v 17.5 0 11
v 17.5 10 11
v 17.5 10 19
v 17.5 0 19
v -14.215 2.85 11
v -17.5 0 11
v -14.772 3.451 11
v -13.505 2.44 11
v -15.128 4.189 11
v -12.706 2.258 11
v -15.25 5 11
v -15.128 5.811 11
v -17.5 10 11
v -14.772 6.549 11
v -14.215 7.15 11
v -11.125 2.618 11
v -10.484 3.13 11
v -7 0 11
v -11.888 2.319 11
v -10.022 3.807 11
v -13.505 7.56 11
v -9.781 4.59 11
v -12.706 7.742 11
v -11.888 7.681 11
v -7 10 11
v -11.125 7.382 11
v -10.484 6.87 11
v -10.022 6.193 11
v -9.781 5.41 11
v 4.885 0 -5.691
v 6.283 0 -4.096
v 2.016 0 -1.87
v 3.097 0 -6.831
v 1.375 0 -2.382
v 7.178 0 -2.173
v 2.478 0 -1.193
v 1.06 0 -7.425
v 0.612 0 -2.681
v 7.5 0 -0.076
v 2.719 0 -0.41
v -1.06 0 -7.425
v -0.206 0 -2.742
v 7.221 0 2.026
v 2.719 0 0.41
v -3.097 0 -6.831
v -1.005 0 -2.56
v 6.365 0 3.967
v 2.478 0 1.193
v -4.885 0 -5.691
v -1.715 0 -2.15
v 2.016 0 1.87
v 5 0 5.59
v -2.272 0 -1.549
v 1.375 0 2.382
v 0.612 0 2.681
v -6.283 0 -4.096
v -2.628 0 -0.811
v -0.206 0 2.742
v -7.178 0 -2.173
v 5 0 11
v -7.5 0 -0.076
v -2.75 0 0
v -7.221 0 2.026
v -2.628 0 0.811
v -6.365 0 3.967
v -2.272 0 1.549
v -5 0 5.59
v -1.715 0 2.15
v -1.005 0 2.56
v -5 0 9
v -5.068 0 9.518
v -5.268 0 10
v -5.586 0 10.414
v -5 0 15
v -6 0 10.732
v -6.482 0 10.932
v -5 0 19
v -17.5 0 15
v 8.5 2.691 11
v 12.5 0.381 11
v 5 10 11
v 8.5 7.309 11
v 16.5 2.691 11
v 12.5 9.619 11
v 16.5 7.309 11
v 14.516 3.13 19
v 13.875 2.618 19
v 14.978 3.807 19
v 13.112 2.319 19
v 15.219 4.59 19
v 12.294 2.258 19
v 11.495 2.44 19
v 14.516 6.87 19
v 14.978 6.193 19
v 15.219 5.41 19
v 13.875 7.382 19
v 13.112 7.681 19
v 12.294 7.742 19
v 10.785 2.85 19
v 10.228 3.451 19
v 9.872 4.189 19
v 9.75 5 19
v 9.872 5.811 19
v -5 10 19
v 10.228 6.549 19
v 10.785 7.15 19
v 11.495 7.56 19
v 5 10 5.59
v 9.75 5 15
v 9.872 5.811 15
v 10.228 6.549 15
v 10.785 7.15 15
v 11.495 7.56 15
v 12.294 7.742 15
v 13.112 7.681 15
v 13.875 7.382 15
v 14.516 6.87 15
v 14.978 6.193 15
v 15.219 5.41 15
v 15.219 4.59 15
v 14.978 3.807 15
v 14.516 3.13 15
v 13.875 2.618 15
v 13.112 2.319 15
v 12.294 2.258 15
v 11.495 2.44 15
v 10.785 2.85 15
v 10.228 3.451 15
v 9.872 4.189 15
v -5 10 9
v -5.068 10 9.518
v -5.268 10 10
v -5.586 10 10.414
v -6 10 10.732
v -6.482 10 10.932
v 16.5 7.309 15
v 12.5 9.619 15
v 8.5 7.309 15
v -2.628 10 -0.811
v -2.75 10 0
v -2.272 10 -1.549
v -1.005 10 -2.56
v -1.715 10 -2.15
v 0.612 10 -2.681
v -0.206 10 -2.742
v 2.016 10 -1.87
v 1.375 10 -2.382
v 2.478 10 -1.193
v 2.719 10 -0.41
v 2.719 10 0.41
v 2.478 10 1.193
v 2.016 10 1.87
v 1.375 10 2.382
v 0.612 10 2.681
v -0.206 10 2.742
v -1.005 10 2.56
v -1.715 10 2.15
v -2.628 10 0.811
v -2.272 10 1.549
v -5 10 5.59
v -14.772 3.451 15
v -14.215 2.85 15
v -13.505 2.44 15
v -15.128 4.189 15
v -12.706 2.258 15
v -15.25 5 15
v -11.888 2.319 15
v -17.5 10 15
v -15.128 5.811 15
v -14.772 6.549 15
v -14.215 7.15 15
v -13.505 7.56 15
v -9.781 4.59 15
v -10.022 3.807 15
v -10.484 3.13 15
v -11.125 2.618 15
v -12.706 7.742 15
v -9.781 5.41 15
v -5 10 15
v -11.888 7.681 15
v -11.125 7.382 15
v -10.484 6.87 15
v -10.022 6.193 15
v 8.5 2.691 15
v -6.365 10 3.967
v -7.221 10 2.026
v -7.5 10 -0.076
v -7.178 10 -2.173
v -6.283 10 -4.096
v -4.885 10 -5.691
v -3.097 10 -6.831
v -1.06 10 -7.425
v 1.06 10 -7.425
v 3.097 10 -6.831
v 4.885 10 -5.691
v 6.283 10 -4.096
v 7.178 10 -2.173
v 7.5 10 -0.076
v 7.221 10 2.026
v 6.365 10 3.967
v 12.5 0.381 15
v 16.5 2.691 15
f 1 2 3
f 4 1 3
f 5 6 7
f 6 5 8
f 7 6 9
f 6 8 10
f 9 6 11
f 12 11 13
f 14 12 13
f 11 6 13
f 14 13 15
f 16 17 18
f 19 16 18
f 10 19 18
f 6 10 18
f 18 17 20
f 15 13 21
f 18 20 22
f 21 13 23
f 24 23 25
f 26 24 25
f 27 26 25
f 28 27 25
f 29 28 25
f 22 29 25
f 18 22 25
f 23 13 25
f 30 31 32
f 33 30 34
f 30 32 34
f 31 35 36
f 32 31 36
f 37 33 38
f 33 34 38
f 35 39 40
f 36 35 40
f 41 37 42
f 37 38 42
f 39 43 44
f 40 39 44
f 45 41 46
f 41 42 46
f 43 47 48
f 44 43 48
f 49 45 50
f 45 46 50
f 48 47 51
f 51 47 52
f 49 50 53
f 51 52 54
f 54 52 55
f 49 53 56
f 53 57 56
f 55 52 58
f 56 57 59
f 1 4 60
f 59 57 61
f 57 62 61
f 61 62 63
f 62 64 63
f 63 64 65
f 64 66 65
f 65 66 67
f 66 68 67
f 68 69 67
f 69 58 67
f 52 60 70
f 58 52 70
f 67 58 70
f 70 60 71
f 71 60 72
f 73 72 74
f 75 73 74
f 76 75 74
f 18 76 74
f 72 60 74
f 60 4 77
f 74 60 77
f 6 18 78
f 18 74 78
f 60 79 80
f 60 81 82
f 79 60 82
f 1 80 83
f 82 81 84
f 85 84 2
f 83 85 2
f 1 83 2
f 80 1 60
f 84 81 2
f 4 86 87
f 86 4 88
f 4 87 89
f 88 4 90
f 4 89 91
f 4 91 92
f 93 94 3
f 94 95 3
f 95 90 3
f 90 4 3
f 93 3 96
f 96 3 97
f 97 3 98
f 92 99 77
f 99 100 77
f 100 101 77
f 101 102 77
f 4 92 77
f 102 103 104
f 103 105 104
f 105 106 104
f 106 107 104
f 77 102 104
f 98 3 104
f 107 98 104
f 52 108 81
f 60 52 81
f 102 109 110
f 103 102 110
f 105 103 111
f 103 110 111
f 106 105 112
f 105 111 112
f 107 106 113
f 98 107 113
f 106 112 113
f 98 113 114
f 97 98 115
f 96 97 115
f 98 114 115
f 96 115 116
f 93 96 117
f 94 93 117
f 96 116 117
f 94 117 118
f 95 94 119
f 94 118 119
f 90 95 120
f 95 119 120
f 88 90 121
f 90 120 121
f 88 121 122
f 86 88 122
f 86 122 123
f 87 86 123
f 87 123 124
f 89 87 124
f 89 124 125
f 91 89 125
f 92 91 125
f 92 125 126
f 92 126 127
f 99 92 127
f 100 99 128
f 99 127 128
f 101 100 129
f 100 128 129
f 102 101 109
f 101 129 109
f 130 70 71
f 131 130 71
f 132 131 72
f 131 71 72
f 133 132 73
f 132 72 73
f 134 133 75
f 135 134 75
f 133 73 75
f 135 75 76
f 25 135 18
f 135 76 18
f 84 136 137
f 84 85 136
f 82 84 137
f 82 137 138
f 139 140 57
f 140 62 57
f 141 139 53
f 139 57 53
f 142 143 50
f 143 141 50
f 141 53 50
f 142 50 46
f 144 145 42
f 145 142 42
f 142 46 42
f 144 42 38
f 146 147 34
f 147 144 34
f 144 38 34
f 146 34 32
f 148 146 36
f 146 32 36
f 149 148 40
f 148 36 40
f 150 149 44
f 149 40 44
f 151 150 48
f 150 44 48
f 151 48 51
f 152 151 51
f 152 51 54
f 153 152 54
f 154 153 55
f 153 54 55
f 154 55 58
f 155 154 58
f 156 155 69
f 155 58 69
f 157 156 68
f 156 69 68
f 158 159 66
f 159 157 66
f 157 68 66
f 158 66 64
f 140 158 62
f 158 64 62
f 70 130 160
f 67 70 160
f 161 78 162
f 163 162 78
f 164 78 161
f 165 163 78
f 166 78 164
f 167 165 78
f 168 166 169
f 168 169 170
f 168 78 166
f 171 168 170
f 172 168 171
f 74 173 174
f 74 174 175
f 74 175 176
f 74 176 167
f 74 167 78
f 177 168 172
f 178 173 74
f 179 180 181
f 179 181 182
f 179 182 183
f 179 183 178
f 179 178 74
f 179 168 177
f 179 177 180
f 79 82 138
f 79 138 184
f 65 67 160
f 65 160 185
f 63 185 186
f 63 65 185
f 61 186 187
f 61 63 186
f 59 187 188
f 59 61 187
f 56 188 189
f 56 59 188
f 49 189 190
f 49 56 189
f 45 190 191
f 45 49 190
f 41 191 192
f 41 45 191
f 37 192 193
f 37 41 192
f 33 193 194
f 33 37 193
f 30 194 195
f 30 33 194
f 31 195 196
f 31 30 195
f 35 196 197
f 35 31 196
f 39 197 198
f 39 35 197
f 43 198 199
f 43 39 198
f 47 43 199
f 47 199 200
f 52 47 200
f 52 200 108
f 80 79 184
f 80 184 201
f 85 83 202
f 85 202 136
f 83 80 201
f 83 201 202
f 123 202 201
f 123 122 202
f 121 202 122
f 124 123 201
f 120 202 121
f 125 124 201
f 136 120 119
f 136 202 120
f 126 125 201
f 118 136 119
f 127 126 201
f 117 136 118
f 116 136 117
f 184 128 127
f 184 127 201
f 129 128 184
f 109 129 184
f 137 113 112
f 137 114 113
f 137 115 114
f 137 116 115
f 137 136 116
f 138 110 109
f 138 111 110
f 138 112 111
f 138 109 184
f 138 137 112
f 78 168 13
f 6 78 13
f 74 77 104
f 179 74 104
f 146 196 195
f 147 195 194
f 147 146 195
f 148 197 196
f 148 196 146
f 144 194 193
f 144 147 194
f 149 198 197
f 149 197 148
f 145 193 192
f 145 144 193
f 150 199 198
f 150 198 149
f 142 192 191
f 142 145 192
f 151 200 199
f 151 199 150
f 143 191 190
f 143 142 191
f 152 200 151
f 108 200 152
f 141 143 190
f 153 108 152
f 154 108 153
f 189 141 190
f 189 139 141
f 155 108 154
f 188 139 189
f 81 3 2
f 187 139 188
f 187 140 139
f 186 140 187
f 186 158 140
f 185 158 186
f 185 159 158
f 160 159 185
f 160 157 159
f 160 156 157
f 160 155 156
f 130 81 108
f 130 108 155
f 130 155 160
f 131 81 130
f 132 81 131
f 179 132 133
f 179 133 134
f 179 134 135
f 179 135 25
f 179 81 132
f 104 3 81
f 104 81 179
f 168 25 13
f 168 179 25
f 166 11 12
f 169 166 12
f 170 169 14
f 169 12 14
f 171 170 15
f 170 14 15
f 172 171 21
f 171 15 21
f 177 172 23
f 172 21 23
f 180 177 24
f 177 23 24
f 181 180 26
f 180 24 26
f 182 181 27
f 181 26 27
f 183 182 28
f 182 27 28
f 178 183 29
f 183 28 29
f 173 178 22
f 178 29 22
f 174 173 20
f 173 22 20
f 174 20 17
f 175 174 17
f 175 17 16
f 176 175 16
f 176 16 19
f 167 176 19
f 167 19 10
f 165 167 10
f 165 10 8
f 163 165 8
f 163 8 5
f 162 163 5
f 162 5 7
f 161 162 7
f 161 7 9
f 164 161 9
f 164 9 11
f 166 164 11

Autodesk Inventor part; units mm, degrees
ref_plane "YZ Plane" through (0, 0, 0) normal (1, 0, 0) x (0, 1, 0)
ref_plane "XZ Plane" through (0, 0, 0) normal (0, 1, 0) x (-1, 0, 0)
ref_plane "XY Plane" through (0, 0, 0) normal (0, 0, 1) x (1, 0, 0)
sketch "Sketch4" plane through (0, 0, 0) normal (0, 1, 0) x (-1, 0, 0)
  circle A0 centre (0, 0) radius 7.5
  circle A1 centre (0, 0) radius 2.75
  dimension "d19" = 15
  dimension "d20" = 5.5
extrude "Extrusion4" add sketch "Sketch4" along normal blind 10
ref_plane "Work Plane1" through (0, 10, 0) normal (0, -1, 0) x (1, 0, 0)
sketch "Sketch7" plane through (0, 10, 0) normal (0, -1, 0) x (1, 0, 0)
  line L0 (0, 0) -> (0, 15)
  line L1 (17.5, 19) -> (-17.5, 19)
  line L2 (-17.5, 19) -> (-17.5, 11)
  line L3 (-17.5, 11) -> (17.5, 11)
  line L4 (17.5, 11) -> (17.5, 19)
  line L5 (17.5, 19) -> (-17.5, 11) construction
  line L6 (-17.5, 19) -> (17.5, 11) construction
  line L7 (5, 24.41) -> (-5, 24.41)
  line L8 (-5, 24.41) -> (-5, 5.59)
  line L9 (-5, 5.59) -> (5, 5.59)
  line L10 (5, 5.59) -> (5, 24.41)
  line L11 (5, 24.41) -> (-5, 5.59) construction
  line L12 (-5, 24.41) -> (5, 5.59) construction
  point P0 (-5, 11)
  point P1 (5, 11)
  dimension "d35" = 15
  dimension "d36" = 35
  dimension "d37" = 8
  dimension "d38" = 10
  dimension "d39" = 18.82
extrude "Extrusion6" add sketch "Sketch7" along normal up to surface (10 mm away) contours L9 L8 L3 L0 | L0 L3 L10 L9 | L3 L8 L1 L10 | L3 L2 L1 L8 | L10 L1 L4 L3
sketch "Sketch8" plane through (-5, 10, 11) normal (0, 0, -1) x (-1, 0, 0)
  point P0 (-5, -10)
sketch "Sketch10" plane through (17.5, 10, 11) normal (0, 0, -1) x (-1, 0, 0)
  circle A0 centre (5, -5) radius 2.75
  circle A1 centre (30, -5) radius 2.75
  line L0 (35, -10) -> (22.5, -10) projected
  line L1 (35, 0) -> (35, -10) projected
  line L2 (0, 0) -> (0, -10) projected
  line L3 (12.5, -10) -> (0, -10) projected
  point P0 (17.5, -10)
  dimension "d50" = 5.5
  dimension "d51" = 5.5
  dimension "d52" = 5
  dimension "d53" = 5
  dimension "d54" = 5
  dimension "d55" = 5
extrude "Extrusion8" cut sketch "Sketch10" against normal through all
sketch "Sketch11" plane through (17.5, 10, 11) normal (0, 0, -1) x (-1, 0, 0)
  circle A0 centre (5, -5) radius 2.75 projected
  line L0 (5, -9.6188) -> (1, -7.3094)
  line L1 (1, -7.3094) -> (1, -2.6906)
  line L2 (1, -2.6906) -> (5, -0.3812)
  line L3 (5, -0.3812) -> (9, -2.6906)
  line L4 (9, -2.6906) -> (9, -7.3094)
  line L5 (9, -7.3094) -> (5, -9.6188)
  line L6 (0, 0) -> (0, -10) projected
  line L7 (12.5, 0) -> (12.5, -10) projected
  line L8 (0, 0) -> (12.5, 0)
  line L9 (12.5, 0) -> (12.5, -10)
  line L10 (12.5, -10) -> (0, -10)
  line L11 (0, -10) -> (0, 0)
  point P0 (17.5, -10)
  point P1 (12.4201, 0)
  dimension "d58" = 8
fillet "Fillet3" radius 2 1 edges at (-5, 5, 11)
extrude "Extrusion10" cut sketch "Sketch11" against normal blind 4 contours L0 L1 L2 L3 L4 L5
sketch "Sketch12" plane through (17.5, 0, 19) normal (0, 0, 1) x (1, 0, 0)
  line L0 (-22.5, 0) -> (-22.5, 10) projected
  line L1 (-35, 10) -> (-35, 0) projected
  line L2 (-22.5, 0) -> (-35, 0)
  line L3 (-35, 0) -> (-35, 10)
  line L4 (-35, 10) -> (-22.5, 10)
  line L5 (-22.5, 10) -> (-22.5, 0)
  point P0 (-17.5, 0)
extrude "Extrusion11" cut sketch "Sketch12" against normal blind 4
properties part number "4mm_Roller_Spacer_R" material "PET Plastic"
